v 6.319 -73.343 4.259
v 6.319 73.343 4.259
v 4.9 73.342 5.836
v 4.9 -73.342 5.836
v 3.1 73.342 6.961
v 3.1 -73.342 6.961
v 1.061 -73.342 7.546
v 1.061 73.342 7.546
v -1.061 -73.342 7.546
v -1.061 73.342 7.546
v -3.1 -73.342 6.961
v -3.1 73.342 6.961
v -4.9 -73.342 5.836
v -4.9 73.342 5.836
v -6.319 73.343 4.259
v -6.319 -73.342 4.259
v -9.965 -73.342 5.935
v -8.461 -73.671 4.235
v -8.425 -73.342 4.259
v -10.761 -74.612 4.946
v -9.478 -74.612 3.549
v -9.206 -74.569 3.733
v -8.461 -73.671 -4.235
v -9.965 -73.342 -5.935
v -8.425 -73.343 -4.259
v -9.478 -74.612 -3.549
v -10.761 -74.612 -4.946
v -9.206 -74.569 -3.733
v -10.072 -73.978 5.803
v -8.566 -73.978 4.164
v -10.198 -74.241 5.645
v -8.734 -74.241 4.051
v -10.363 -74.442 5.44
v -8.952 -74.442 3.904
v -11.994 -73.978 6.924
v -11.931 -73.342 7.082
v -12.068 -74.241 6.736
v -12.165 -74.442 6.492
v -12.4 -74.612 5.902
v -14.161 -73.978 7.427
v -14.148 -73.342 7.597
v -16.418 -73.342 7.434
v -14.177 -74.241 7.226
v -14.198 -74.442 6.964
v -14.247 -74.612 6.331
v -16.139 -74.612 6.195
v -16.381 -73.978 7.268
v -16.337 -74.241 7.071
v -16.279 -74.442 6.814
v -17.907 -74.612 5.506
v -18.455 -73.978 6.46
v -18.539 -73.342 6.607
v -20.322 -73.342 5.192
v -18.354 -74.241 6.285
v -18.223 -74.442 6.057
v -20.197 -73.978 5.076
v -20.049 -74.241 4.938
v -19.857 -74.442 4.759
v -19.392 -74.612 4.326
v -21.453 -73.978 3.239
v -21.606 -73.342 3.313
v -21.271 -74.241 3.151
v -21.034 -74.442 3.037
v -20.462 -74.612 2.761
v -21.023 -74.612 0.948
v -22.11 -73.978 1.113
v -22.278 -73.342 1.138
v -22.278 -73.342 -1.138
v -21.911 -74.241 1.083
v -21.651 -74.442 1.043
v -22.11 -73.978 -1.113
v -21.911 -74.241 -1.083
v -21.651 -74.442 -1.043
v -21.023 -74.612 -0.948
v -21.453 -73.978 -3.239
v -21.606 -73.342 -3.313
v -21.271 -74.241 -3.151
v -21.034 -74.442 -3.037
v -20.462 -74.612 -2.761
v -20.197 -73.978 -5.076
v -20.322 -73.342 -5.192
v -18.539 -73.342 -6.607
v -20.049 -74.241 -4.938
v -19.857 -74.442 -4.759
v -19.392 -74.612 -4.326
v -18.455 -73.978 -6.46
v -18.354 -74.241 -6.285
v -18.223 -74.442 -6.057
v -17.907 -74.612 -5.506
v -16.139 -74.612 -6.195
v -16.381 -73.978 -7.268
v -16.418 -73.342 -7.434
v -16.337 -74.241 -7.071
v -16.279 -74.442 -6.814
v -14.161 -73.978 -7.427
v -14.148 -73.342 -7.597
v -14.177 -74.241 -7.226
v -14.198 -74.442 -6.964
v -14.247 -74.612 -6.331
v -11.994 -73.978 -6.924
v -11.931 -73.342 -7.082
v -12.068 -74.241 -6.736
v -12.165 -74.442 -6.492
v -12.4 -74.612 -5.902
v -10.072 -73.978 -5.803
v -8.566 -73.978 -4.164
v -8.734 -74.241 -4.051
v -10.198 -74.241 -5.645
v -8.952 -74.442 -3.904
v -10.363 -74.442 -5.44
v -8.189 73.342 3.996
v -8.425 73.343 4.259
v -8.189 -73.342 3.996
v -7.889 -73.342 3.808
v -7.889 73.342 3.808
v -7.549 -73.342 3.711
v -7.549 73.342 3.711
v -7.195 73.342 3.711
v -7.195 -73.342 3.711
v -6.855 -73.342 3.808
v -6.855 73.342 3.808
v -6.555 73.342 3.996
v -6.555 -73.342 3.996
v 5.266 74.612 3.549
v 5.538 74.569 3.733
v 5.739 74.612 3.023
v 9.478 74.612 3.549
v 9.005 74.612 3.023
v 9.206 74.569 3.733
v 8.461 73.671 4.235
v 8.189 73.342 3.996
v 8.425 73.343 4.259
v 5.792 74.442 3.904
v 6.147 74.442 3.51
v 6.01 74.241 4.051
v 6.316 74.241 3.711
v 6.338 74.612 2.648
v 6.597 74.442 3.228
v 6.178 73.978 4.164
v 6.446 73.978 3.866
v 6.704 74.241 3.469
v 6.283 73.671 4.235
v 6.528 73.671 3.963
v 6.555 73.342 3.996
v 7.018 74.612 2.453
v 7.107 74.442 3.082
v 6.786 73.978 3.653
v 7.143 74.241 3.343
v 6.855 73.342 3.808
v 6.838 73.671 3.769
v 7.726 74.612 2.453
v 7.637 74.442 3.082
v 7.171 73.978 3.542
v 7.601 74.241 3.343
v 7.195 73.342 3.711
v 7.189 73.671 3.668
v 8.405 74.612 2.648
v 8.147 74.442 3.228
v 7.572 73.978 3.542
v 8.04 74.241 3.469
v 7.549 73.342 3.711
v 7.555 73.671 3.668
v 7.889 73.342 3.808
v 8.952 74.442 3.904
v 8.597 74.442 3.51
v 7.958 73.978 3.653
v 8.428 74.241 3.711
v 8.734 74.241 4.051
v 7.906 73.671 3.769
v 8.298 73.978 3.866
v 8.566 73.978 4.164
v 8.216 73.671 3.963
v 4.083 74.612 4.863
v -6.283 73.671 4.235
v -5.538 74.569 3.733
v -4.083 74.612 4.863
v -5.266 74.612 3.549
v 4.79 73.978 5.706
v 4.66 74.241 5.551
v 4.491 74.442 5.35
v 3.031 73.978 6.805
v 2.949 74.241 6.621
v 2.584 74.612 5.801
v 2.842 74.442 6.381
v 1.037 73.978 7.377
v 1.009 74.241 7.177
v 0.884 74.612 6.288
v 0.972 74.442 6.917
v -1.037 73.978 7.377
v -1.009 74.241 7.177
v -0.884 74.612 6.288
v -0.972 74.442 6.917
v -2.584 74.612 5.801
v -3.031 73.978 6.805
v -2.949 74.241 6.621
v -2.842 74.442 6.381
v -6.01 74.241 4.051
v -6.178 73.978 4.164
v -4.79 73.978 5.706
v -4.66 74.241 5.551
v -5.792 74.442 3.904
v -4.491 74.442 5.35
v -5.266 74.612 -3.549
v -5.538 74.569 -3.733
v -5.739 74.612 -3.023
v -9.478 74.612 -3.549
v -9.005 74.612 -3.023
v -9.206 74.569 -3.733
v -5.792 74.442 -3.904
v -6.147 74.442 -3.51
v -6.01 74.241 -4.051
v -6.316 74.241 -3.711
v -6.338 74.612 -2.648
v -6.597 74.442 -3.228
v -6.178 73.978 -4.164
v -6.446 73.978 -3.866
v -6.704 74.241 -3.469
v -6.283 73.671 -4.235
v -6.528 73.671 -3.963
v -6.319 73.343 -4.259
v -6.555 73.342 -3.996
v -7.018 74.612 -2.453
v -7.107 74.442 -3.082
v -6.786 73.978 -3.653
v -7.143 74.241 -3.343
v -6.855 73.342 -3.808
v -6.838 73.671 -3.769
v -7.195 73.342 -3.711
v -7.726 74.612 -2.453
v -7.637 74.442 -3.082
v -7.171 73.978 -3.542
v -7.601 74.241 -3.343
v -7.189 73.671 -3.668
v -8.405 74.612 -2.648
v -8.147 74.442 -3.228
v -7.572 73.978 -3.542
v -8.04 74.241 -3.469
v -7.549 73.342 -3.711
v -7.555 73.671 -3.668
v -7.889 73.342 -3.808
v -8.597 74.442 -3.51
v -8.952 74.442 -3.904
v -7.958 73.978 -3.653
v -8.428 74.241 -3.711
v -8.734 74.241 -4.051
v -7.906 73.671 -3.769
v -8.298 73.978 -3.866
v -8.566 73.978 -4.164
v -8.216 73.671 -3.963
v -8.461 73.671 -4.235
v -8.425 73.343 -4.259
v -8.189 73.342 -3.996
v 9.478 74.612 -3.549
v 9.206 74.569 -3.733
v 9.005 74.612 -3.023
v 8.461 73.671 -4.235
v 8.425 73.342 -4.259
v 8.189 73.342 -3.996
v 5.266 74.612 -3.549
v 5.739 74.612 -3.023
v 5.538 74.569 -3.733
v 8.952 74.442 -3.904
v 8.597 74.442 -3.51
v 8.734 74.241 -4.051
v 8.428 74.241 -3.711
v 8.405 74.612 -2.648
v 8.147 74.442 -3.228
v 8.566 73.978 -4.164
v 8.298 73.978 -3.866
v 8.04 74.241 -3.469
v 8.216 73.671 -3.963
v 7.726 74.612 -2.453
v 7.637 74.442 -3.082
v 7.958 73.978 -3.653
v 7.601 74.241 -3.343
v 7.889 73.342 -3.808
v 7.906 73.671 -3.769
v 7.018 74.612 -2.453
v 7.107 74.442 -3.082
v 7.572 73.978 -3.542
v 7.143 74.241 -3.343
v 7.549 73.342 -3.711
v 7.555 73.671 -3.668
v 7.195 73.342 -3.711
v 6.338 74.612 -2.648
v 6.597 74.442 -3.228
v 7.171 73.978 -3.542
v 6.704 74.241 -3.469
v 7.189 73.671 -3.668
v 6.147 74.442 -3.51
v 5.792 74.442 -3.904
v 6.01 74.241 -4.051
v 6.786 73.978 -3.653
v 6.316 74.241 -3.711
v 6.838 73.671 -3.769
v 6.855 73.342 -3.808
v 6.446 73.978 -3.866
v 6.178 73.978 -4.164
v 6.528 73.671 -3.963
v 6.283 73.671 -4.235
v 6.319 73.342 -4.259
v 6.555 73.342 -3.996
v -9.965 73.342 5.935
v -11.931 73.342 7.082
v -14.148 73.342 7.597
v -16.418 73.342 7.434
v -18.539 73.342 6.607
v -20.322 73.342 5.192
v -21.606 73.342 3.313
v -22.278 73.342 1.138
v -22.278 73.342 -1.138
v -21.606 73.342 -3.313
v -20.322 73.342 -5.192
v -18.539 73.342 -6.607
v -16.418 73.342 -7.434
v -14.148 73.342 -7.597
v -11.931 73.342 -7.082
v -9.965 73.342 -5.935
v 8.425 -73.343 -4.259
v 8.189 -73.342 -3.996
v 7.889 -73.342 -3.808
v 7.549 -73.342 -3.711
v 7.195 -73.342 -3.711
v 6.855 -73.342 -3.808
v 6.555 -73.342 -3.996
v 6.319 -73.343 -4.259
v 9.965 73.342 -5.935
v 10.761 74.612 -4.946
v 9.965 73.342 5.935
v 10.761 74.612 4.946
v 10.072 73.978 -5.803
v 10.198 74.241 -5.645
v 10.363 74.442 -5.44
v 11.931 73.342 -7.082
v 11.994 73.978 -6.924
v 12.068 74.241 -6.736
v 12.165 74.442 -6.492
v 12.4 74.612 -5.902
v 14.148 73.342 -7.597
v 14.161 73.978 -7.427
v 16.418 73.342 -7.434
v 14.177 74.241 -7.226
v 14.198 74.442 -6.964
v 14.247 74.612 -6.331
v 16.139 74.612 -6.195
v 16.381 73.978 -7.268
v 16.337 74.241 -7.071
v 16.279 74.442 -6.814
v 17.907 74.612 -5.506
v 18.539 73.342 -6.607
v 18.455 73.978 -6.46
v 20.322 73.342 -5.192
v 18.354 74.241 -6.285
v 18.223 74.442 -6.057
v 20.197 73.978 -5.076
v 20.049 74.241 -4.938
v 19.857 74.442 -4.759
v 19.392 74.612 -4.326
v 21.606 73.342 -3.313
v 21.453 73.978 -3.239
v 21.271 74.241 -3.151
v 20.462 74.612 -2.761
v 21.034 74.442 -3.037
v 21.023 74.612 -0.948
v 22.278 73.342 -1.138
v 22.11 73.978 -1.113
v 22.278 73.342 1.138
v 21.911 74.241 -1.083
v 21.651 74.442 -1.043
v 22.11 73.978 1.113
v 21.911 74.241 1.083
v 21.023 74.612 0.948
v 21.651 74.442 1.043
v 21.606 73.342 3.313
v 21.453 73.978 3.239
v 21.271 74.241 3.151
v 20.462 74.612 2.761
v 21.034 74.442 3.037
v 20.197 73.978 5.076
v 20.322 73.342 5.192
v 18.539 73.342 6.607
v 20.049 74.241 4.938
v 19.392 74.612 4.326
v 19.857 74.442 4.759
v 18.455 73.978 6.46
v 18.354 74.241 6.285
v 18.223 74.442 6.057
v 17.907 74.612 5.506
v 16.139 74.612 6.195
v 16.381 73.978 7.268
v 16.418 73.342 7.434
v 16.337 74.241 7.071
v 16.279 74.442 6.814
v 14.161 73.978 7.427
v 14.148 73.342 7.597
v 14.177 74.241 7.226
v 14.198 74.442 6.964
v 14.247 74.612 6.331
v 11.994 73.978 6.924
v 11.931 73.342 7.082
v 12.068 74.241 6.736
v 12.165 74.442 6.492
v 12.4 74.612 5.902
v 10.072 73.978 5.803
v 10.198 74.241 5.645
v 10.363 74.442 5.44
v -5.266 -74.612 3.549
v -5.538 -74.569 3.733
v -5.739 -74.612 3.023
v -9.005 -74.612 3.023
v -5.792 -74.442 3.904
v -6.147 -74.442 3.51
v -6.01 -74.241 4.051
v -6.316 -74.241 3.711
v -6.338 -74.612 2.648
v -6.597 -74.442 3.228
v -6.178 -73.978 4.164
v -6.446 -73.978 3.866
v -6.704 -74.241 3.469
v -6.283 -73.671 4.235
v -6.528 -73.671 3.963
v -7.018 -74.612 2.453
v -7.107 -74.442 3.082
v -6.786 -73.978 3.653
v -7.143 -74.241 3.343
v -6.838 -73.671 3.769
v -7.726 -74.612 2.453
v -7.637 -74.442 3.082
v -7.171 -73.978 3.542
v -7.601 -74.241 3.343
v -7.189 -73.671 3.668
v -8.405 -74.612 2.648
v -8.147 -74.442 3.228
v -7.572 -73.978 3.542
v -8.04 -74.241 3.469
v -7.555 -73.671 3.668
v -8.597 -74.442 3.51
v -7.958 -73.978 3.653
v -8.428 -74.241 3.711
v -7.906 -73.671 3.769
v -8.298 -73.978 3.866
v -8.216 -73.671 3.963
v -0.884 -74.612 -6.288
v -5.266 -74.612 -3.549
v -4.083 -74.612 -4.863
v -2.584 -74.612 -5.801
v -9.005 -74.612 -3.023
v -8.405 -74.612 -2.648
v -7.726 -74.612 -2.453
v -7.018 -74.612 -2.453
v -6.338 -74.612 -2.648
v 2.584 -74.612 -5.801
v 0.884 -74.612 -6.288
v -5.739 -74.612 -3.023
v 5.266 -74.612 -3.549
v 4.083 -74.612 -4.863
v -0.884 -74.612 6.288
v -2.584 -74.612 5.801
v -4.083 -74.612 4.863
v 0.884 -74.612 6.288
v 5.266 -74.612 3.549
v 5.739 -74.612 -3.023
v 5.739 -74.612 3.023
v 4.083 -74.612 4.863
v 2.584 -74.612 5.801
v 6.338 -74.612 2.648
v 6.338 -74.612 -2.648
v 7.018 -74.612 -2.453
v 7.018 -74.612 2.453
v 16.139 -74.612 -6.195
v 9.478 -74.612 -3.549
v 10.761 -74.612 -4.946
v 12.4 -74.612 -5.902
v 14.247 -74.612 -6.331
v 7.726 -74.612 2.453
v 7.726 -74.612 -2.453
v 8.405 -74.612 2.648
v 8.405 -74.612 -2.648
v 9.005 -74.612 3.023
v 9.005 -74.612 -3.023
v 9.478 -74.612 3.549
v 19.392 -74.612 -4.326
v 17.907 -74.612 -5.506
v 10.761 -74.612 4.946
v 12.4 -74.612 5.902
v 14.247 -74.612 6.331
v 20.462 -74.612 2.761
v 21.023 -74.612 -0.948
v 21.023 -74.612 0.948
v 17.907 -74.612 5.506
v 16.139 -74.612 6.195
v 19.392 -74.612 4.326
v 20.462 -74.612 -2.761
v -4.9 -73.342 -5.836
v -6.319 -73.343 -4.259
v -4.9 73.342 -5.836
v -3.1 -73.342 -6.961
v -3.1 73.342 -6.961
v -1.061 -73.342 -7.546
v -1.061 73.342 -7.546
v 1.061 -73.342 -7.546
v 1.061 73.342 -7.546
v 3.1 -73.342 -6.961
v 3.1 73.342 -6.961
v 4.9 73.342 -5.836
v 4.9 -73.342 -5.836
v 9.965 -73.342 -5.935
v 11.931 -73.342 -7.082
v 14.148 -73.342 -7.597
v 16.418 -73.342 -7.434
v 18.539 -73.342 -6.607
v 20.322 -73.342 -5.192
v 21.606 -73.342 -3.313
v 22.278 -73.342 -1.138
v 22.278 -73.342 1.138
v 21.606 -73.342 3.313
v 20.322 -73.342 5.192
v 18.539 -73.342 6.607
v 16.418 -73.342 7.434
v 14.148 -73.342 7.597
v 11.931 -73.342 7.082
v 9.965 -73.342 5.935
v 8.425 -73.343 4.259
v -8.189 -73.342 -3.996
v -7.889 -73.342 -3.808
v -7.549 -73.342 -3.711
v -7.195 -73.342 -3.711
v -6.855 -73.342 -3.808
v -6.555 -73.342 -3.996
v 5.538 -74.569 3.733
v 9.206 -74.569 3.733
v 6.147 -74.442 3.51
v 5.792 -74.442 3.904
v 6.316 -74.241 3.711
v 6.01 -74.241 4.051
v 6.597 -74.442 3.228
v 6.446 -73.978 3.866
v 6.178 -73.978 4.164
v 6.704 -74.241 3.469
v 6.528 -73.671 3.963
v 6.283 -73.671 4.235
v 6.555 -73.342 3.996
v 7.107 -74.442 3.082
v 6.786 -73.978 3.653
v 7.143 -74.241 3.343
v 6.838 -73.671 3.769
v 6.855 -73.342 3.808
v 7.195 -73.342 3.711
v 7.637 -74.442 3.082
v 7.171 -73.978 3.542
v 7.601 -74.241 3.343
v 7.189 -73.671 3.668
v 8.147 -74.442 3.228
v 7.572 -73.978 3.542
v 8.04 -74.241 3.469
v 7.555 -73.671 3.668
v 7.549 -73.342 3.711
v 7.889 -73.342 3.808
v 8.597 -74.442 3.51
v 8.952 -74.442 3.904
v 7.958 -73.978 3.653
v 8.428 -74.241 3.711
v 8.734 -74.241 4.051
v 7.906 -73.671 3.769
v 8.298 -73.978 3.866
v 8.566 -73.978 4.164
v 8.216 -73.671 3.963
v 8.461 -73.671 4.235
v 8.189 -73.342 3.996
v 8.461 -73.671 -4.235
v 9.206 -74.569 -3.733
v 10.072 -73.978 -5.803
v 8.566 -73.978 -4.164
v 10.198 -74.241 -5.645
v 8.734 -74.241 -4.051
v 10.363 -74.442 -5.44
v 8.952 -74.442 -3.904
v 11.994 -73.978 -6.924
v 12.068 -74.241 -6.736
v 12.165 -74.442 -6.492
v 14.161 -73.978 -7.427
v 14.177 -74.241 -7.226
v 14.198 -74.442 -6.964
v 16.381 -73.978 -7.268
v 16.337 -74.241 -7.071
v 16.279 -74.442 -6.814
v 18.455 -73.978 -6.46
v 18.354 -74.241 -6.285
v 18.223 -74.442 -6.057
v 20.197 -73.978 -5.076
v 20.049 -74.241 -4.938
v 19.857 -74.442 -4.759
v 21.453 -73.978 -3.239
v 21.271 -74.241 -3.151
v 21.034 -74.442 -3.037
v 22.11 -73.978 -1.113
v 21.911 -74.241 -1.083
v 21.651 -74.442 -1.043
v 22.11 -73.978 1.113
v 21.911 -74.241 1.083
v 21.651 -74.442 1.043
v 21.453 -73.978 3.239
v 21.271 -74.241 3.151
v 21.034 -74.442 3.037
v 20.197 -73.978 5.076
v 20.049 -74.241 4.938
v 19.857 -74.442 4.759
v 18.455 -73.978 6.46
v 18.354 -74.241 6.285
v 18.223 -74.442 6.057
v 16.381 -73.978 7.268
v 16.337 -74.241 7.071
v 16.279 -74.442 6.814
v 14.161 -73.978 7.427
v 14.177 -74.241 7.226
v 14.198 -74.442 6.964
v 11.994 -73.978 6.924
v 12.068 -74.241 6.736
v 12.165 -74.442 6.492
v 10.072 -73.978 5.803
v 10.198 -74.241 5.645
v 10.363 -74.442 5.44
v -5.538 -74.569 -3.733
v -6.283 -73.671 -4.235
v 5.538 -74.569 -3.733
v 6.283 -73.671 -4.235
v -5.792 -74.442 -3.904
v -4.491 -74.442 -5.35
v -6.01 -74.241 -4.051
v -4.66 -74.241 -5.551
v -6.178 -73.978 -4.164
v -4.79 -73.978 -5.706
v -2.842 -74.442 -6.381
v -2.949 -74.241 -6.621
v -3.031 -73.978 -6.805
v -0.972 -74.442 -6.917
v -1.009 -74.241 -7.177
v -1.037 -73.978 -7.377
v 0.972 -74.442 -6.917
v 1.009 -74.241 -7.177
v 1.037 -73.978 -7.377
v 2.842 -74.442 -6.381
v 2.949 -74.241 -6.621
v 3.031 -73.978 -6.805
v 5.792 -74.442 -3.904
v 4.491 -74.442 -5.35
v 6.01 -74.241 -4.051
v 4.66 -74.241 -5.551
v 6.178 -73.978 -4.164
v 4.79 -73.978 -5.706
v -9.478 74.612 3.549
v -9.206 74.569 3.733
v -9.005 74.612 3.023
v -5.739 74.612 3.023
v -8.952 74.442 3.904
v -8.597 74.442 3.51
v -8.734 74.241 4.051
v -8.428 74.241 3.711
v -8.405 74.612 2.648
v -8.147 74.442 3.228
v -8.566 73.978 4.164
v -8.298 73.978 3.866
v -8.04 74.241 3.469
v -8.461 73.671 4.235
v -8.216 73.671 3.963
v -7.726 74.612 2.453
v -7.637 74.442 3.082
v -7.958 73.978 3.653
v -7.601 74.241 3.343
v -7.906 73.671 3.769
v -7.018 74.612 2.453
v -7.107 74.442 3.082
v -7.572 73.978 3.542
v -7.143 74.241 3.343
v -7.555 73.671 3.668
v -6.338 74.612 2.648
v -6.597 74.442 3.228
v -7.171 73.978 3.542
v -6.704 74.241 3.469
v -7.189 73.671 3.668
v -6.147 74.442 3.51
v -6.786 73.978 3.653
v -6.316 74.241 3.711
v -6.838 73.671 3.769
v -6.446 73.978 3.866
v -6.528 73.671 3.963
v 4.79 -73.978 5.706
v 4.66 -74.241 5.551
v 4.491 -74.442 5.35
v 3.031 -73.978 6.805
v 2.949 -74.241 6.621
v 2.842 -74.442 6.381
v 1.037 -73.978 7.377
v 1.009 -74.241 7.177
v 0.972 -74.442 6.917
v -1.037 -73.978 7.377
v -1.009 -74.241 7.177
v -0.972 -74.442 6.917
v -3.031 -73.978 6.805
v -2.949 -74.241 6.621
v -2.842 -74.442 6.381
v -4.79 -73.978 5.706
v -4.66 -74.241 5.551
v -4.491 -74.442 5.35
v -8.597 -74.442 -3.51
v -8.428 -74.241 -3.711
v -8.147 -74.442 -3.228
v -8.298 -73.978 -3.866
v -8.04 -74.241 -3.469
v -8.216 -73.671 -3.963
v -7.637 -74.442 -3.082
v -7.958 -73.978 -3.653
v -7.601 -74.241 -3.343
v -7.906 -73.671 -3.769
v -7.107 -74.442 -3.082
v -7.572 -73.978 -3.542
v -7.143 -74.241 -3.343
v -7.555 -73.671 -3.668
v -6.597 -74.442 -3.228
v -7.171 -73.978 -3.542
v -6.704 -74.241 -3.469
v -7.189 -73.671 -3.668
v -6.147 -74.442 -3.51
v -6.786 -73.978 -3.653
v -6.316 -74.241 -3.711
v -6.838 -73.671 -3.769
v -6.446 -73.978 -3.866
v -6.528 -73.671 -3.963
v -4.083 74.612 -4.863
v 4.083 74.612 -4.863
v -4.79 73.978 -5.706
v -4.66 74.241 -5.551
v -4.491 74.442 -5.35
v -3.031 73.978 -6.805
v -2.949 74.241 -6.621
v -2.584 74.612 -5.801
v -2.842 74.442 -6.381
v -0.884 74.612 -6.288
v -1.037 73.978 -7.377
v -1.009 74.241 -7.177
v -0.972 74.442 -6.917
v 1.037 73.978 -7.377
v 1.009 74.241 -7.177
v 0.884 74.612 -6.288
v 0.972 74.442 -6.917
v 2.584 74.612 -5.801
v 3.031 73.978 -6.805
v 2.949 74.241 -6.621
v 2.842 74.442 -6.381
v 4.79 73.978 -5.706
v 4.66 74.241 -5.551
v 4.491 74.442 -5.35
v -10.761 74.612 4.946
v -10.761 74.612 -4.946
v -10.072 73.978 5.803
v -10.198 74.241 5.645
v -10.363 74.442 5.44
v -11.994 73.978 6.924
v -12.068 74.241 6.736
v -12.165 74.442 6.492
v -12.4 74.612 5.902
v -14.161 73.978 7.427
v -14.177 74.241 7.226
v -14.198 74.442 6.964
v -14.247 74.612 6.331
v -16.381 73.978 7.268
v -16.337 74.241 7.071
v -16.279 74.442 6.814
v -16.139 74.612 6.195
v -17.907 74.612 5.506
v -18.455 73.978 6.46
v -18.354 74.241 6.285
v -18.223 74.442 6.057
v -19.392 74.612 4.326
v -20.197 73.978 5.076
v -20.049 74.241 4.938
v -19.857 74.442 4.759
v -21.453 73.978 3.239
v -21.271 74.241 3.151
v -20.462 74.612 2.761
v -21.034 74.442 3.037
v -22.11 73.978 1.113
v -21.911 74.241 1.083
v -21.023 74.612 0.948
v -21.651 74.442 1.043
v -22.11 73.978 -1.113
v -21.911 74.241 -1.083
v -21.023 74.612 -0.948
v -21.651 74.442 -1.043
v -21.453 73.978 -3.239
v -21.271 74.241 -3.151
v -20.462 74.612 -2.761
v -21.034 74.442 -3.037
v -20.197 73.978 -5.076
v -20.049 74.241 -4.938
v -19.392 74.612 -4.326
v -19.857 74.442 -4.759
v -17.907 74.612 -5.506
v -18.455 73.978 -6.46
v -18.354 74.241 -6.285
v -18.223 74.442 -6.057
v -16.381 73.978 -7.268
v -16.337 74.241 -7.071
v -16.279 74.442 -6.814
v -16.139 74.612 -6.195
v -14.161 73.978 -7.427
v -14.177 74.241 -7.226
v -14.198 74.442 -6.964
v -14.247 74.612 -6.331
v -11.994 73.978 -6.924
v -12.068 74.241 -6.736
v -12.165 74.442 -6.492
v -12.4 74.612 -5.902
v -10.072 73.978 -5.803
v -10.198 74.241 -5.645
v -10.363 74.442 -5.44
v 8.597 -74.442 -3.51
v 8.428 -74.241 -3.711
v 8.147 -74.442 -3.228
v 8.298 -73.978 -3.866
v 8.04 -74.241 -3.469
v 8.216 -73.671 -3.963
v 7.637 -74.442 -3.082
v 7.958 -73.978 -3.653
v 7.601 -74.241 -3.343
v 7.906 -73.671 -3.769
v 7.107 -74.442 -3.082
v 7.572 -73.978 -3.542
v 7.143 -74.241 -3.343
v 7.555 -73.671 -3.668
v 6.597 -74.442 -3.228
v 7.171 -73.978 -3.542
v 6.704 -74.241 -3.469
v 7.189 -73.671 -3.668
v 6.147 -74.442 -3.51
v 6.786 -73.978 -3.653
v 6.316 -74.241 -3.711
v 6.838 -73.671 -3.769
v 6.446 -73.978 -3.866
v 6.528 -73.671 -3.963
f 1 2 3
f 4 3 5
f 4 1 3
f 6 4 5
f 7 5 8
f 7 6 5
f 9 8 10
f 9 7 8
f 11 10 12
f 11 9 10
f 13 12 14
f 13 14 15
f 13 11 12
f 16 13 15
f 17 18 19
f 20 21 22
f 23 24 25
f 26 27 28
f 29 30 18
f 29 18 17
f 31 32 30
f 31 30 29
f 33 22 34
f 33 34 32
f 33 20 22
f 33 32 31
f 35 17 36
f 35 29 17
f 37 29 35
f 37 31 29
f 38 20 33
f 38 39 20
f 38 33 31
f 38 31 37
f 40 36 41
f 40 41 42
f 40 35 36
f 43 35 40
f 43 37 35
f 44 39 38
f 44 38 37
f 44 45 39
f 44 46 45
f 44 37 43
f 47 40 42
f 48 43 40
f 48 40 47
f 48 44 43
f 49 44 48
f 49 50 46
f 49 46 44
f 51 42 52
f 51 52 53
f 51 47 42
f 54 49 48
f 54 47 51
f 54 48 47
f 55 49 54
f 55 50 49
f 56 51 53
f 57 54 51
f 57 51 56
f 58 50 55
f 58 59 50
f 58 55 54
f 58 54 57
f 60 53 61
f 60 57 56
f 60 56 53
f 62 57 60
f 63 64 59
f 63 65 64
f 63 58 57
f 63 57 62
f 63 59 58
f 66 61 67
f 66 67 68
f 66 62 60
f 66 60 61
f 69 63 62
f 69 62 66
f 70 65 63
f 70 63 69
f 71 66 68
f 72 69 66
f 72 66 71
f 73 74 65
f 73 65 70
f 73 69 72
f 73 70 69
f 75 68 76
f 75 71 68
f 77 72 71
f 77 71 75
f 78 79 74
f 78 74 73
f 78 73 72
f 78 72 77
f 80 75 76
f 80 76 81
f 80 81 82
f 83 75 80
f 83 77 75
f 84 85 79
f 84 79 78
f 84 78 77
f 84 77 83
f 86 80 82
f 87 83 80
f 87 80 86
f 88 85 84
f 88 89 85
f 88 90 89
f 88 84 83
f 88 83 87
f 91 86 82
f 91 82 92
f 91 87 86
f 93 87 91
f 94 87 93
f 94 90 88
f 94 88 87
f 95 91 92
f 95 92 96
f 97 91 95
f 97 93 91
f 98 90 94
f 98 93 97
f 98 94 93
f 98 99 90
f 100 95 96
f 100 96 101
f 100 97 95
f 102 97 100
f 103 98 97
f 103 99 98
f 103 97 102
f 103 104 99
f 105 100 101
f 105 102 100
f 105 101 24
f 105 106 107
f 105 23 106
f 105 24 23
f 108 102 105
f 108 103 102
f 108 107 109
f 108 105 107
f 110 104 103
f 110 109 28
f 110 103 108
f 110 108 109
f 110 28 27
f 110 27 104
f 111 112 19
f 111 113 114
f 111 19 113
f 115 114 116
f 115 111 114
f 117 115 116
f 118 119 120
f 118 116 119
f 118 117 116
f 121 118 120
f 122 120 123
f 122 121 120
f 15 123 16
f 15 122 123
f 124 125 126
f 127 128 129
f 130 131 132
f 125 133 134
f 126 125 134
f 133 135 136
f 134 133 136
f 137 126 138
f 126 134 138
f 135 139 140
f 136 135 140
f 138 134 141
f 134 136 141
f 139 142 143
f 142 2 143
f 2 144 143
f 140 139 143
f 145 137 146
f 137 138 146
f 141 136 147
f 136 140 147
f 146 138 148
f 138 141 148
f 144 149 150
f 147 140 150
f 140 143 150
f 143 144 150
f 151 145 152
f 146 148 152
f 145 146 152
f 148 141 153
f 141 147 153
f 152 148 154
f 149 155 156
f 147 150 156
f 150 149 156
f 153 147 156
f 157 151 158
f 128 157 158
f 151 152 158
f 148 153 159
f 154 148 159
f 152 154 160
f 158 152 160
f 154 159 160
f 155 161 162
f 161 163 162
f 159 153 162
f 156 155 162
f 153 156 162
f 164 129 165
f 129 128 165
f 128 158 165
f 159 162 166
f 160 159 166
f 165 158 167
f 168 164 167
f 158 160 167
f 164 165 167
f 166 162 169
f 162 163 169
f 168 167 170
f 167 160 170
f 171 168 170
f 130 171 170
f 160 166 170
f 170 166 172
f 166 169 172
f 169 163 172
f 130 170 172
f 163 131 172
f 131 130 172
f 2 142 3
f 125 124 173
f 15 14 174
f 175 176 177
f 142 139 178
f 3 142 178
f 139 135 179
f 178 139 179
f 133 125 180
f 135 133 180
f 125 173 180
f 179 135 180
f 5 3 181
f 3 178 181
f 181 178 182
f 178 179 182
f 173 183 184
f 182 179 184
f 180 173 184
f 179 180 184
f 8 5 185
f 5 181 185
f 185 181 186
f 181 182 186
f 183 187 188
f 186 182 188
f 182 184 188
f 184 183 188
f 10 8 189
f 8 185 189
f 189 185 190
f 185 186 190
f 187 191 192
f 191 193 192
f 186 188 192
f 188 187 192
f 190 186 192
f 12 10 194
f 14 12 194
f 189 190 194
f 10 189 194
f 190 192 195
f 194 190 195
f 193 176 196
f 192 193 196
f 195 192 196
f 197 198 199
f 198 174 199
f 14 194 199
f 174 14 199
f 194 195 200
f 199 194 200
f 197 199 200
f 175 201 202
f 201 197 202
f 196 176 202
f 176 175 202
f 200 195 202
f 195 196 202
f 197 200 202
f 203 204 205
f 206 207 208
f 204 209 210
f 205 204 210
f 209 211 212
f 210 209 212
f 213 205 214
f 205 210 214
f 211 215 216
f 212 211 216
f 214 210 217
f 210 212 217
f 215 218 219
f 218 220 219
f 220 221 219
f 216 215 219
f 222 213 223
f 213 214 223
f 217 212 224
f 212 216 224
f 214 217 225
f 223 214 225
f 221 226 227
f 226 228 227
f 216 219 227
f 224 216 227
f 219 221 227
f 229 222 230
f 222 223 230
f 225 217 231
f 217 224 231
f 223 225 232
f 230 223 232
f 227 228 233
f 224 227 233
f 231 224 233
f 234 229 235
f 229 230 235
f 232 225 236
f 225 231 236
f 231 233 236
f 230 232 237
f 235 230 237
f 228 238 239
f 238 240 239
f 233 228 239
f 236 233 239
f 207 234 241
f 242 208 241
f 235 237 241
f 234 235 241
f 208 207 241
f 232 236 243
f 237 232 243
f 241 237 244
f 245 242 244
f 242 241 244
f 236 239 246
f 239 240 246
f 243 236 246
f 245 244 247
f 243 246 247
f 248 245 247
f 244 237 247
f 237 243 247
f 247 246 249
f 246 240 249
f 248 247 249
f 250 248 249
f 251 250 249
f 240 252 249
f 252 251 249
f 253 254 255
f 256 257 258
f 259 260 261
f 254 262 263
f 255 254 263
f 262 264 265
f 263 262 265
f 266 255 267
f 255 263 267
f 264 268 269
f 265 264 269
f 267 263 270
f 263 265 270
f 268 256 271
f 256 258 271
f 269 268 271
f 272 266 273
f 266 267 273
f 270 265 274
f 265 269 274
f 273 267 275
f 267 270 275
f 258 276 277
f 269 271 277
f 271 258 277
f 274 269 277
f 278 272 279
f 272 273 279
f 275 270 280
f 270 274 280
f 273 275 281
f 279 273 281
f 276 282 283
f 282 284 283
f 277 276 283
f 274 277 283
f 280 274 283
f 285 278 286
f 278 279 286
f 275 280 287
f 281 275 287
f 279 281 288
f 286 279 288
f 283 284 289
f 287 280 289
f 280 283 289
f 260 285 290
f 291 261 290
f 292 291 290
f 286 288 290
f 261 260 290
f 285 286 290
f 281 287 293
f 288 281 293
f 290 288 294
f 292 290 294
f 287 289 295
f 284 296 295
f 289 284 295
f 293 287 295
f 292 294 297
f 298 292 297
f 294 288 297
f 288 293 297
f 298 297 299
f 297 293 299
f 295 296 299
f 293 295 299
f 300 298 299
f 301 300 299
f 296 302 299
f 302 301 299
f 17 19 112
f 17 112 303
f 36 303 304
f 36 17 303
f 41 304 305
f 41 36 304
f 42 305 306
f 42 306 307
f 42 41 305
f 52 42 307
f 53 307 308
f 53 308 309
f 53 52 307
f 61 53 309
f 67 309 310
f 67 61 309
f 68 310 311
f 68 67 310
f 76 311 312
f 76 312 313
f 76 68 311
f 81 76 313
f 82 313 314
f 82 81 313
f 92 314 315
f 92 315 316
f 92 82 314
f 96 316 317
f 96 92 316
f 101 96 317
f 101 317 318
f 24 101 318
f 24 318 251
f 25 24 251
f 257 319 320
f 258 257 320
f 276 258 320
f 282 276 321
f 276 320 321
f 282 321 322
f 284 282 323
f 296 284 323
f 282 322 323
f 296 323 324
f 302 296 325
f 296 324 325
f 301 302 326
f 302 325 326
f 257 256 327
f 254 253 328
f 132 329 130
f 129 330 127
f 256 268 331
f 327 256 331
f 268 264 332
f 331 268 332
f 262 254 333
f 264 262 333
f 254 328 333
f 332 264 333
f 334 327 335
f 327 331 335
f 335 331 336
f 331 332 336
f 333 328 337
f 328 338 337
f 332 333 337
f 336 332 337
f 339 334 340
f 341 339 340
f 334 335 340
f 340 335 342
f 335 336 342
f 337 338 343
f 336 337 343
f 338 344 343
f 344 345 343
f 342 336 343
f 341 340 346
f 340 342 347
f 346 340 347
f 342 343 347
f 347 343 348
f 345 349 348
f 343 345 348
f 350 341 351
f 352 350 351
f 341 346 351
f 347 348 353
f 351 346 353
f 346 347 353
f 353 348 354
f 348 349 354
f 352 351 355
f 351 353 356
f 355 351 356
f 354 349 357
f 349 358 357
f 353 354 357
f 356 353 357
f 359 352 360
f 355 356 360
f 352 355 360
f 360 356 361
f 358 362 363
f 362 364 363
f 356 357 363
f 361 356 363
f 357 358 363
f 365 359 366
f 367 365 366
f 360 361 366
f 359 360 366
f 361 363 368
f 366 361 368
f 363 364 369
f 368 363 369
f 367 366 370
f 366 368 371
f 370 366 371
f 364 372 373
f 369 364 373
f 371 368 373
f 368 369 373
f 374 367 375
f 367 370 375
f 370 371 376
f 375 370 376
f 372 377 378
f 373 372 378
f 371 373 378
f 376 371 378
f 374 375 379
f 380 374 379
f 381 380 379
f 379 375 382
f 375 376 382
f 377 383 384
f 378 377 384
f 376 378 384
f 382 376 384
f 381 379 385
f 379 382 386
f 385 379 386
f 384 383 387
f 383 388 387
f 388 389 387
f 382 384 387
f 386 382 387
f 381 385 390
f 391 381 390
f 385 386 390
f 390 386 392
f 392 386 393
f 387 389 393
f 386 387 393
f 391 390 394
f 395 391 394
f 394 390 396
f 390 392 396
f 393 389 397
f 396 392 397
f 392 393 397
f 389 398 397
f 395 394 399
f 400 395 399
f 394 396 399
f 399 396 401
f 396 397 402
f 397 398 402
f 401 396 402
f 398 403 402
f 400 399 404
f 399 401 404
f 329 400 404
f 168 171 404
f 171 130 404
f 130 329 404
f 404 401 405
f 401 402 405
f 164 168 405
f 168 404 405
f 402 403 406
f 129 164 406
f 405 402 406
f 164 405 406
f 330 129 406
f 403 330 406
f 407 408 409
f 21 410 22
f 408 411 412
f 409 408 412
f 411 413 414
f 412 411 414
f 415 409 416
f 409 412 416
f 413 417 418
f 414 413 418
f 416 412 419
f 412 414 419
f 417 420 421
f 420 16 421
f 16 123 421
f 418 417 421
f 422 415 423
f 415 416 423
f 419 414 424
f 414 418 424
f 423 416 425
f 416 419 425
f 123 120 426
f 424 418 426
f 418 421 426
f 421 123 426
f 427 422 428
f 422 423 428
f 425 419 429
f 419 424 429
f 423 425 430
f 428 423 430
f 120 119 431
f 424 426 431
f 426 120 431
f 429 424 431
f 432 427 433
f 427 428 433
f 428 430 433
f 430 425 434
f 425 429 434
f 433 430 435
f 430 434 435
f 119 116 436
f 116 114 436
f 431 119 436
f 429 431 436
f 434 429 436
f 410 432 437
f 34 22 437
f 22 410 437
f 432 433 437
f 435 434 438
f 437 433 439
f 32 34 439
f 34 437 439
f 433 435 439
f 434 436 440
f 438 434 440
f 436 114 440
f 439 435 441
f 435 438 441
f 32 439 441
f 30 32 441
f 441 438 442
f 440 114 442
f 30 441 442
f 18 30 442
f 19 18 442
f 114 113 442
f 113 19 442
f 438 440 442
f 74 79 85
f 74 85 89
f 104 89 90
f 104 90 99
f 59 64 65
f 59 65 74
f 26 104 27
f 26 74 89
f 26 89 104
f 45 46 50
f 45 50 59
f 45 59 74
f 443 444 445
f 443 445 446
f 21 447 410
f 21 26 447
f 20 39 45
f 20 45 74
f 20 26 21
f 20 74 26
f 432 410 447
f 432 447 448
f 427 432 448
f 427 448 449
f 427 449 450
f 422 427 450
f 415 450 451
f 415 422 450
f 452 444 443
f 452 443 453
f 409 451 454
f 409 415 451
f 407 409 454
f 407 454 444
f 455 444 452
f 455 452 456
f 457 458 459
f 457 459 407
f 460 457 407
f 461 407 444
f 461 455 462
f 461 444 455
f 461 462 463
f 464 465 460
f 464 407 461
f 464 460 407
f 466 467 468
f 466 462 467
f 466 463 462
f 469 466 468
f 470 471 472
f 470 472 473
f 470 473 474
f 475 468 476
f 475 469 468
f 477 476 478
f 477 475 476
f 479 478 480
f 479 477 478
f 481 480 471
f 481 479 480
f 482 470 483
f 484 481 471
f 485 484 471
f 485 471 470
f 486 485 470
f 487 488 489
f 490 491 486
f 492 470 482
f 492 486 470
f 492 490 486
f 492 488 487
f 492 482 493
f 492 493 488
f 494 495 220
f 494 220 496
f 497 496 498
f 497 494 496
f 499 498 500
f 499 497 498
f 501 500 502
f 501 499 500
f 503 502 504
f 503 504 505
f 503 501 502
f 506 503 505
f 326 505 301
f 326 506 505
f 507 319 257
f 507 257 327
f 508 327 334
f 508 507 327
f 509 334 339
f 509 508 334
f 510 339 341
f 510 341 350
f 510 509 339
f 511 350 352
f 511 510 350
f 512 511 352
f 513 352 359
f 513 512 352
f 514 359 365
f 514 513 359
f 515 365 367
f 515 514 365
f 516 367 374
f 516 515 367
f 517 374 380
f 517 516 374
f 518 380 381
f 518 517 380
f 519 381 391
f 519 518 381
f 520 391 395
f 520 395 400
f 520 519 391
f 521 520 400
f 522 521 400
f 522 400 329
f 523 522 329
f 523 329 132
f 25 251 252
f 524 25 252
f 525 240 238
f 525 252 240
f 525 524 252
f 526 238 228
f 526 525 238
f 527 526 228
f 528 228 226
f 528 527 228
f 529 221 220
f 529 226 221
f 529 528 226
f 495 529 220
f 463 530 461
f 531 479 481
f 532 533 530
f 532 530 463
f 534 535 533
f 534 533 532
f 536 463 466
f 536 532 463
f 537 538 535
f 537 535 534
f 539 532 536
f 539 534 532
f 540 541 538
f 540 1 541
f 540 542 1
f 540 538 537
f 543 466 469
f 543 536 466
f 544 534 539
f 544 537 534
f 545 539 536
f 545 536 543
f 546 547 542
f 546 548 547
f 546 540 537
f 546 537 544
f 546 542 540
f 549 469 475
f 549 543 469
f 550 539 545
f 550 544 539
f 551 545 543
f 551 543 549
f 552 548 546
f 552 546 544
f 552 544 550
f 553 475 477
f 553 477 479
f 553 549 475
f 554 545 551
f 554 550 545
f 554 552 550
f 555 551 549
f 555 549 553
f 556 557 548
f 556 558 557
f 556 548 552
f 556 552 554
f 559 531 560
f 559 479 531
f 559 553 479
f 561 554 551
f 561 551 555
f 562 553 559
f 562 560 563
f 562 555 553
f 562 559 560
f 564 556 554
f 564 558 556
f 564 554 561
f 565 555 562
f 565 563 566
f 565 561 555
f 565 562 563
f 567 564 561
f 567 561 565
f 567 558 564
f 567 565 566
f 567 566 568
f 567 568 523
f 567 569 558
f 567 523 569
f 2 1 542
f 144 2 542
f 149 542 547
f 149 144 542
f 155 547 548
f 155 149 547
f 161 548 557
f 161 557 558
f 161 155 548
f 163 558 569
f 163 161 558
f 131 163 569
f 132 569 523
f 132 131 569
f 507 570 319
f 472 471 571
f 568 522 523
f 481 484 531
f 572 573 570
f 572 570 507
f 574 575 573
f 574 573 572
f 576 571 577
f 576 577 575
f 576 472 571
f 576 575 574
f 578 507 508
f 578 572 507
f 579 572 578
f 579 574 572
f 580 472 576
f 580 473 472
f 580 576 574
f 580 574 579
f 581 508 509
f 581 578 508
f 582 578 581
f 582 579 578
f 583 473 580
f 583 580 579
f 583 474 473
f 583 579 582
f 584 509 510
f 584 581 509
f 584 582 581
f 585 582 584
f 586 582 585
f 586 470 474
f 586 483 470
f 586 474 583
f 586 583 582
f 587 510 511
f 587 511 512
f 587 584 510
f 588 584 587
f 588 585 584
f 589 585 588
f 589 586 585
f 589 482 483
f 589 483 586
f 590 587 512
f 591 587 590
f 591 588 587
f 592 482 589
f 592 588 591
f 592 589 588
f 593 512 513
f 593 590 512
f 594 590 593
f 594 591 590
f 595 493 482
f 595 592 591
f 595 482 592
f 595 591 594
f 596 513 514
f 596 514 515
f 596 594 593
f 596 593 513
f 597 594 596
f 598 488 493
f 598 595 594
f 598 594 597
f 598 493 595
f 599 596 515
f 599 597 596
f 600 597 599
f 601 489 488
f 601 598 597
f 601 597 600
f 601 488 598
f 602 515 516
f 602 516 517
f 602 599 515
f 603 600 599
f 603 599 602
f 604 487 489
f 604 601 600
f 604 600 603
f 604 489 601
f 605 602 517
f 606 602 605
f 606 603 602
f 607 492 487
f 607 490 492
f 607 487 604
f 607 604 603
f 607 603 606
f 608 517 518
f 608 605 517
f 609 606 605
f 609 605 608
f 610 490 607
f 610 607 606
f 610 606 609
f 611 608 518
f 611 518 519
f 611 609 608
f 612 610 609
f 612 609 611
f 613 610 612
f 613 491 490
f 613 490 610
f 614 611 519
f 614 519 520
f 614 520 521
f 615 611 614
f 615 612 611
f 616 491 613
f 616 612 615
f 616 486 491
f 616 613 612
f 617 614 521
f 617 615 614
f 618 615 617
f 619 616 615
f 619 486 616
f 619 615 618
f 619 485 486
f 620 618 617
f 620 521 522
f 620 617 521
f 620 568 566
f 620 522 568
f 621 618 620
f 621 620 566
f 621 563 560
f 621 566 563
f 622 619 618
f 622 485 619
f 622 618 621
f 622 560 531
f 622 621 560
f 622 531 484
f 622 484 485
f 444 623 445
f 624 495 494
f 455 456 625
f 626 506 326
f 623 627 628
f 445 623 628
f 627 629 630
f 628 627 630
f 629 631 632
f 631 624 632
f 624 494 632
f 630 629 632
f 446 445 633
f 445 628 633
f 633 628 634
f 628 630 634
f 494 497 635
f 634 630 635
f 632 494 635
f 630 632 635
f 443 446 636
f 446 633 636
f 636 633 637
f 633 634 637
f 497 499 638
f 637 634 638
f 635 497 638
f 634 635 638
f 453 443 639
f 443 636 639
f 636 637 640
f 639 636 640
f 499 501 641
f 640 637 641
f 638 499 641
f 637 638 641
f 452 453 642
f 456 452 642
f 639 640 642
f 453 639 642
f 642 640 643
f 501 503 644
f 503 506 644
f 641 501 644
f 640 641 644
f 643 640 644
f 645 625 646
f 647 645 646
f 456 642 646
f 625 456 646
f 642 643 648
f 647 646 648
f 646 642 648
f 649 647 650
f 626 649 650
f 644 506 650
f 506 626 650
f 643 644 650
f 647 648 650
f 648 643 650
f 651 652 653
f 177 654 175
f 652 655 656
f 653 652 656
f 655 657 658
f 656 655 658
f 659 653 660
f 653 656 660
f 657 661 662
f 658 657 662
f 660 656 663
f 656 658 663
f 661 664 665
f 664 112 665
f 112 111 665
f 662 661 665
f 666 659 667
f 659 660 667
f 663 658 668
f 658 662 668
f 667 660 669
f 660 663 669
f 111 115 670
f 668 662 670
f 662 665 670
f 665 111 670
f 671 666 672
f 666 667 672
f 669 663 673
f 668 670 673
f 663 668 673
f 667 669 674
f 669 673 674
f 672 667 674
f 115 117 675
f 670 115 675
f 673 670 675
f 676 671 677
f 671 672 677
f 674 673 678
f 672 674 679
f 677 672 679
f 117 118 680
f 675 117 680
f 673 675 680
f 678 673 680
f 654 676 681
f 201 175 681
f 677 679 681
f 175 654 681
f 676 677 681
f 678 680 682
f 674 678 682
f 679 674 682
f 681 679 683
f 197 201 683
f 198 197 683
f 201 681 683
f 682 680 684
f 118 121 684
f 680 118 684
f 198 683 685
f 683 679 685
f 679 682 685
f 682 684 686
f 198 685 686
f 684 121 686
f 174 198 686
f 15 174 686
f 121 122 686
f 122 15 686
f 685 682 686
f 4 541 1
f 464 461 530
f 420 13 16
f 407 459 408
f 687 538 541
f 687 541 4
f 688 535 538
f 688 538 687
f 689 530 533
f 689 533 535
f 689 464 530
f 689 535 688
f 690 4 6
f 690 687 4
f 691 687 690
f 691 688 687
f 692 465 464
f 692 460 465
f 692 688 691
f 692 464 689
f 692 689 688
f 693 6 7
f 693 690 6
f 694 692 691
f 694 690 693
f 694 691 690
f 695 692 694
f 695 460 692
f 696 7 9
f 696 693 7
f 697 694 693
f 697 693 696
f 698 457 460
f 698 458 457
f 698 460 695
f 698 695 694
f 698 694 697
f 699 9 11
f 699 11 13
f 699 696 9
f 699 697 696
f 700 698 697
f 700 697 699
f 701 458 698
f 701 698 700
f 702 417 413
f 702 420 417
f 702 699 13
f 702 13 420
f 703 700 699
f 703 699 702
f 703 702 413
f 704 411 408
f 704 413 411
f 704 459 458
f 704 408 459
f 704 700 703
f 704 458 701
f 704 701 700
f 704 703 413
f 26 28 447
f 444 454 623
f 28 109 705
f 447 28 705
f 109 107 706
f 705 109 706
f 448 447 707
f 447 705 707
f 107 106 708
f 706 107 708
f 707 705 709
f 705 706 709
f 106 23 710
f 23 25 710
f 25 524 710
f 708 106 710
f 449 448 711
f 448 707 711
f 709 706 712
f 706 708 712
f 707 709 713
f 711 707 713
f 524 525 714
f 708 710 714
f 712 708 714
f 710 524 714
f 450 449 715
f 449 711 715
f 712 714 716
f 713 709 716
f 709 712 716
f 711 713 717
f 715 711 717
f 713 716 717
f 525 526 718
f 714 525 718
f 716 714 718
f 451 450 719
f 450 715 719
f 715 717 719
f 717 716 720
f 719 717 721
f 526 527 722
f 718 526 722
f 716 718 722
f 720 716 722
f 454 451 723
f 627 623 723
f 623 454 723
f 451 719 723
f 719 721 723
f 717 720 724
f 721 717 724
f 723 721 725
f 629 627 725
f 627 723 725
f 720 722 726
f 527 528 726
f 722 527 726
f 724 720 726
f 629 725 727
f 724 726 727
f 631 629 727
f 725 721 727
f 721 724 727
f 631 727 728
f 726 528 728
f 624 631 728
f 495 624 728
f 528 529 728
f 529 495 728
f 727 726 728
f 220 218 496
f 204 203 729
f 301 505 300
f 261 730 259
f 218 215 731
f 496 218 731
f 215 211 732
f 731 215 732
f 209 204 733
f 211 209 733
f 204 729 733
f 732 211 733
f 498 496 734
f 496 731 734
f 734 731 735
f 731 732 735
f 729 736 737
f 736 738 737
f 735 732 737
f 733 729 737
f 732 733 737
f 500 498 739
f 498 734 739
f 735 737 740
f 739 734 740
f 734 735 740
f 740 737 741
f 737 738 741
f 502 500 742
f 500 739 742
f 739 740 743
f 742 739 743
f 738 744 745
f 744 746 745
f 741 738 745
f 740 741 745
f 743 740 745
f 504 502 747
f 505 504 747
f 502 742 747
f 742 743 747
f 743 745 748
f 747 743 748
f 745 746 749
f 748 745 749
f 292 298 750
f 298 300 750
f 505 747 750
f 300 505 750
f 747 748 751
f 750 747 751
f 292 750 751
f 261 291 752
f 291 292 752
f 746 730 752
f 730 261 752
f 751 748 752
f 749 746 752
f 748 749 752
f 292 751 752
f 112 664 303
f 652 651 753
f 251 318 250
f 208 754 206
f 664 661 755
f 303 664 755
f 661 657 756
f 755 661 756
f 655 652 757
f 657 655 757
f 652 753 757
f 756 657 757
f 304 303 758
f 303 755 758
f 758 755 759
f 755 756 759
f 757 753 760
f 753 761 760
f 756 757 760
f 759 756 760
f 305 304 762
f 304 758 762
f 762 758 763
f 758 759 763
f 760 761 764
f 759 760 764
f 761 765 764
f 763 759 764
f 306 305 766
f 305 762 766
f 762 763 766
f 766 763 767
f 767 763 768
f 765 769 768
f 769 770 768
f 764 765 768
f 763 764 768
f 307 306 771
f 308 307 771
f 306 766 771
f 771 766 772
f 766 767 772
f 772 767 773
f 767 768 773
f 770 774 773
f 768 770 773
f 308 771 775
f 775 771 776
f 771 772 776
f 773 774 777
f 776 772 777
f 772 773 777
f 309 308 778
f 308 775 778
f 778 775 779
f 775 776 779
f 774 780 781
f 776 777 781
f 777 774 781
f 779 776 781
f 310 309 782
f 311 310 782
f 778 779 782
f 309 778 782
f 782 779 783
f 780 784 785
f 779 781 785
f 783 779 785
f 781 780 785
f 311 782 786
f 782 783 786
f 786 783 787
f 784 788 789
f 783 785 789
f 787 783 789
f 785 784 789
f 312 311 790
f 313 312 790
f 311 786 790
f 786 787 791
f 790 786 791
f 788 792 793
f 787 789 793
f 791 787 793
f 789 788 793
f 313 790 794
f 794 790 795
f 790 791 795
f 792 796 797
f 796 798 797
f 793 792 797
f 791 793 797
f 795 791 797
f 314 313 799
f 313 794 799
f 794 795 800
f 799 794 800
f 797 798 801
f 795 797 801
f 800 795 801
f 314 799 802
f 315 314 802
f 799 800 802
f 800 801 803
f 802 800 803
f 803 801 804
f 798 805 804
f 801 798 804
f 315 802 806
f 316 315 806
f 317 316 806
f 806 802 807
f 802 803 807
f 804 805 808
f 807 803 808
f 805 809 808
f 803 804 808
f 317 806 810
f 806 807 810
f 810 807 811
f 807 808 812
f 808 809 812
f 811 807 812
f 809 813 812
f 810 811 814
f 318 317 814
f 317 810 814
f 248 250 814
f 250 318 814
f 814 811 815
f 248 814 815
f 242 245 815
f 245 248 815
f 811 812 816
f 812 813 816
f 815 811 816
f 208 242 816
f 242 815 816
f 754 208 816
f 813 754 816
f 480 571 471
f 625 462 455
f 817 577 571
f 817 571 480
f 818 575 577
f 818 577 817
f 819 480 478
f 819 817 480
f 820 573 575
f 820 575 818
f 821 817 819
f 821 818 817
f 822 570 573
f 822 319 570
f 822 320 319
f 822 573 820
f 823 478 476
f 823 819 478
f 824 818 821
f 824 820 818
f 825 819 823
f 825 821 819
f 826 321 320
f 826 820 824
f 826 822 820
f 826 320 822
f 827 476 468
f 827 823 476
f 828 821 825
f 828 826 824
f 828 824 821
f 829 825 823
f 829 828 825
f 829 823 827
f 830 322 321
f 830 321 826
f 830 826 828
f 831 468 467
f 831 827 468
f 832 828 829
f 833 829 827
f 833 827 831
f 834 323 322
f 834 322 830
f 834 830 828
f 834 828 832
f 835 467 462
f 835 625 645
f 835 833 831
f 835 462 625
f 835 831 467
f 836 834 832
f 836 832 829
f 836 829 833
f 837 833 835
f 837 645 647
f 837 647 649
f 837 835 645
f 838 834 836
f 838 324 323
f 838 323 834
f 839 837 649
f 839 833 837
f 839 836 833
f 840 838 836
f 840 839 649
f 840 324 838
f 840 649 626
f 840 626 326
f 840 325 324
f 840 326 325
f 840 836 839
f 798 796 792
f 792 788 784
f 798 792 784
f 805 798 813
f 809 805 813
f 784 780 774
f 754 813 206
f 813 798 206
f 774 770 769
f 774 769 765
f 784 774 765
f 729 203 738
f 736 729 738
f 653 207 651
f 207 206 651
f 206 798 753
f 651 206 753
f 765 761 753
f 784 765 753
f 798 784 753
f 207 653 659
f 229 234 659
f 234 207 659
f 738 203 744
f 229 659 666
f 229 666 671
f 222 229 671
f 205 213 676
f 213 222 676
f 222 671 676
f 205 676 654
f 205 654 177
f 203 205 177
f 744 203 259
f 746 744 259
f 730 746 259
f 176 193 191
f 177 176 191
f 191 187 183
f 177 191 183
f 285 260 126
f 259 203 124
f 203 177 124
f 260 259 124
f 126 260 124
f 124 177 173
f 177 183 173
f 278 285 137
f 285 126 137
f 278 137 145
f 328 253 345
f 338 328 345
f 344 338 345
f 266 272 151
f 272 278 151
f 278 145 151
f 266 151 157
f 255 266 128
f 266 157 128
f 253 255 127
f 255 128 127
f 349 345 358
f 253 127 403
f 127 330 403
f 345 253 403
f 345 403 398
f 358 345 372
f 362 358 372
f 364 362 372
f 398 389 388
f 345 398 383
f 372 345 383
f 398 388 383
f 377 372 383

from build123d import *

# Parameters (mm, degrees)
F1_DEPTH = 74.6125
F2_R     = 1.27


with BuildPart() as f1:
    # F0 (on Front) → F1 (new body, symmetric)
    with BuildSketch(Plane.XZ):
        with BuildLine():
            ThreePointArc((-7.3719540369, 1.9283914741), (-22.3639080738, 0), (-7.3719540369, -1.9283914741))
            ThreePointArc((-7.3719540369, -1.9283914741), (0, -7.62), (7.3719540369, -1.9283914741))
            ThreePointArc((7.3719540369, -1.9283914741), (22.3639080738, 0), (7.3719540369, 1.9283914741))
            ThreePointArc((7.3719540369, 1.9283914741), (0, 7.62), (-7.3719540369, 1.9283914741))
        make_face()
    extrude(amount=F1_DEPTH, both=True)

    # F2
    f2_edges = [f1.edges().sort_by_distance(p)[0] for p in [
        (7.371954, 0, 1.928391),
        (0, 74.6125, 7.62),
        (-7.371954, 0, 1.928391),
        (0, -74.6125, 7.62),
        (7.371954, 0, -1.928391),
        (22.363908, 74.6125, 0),
        (22.363908, -74.6125, 0),
        (-22.363908, 74.6125, 0),
        (-7.371954, 0, -1.928391),
        (-22.363908, -74.6125, 0),
        (0, 74.6125, -7.62),
        (0, -74.6125, -7.62),
    ]]
    fillet(f2_edges, radius=F2_R)


solid = f1.part
